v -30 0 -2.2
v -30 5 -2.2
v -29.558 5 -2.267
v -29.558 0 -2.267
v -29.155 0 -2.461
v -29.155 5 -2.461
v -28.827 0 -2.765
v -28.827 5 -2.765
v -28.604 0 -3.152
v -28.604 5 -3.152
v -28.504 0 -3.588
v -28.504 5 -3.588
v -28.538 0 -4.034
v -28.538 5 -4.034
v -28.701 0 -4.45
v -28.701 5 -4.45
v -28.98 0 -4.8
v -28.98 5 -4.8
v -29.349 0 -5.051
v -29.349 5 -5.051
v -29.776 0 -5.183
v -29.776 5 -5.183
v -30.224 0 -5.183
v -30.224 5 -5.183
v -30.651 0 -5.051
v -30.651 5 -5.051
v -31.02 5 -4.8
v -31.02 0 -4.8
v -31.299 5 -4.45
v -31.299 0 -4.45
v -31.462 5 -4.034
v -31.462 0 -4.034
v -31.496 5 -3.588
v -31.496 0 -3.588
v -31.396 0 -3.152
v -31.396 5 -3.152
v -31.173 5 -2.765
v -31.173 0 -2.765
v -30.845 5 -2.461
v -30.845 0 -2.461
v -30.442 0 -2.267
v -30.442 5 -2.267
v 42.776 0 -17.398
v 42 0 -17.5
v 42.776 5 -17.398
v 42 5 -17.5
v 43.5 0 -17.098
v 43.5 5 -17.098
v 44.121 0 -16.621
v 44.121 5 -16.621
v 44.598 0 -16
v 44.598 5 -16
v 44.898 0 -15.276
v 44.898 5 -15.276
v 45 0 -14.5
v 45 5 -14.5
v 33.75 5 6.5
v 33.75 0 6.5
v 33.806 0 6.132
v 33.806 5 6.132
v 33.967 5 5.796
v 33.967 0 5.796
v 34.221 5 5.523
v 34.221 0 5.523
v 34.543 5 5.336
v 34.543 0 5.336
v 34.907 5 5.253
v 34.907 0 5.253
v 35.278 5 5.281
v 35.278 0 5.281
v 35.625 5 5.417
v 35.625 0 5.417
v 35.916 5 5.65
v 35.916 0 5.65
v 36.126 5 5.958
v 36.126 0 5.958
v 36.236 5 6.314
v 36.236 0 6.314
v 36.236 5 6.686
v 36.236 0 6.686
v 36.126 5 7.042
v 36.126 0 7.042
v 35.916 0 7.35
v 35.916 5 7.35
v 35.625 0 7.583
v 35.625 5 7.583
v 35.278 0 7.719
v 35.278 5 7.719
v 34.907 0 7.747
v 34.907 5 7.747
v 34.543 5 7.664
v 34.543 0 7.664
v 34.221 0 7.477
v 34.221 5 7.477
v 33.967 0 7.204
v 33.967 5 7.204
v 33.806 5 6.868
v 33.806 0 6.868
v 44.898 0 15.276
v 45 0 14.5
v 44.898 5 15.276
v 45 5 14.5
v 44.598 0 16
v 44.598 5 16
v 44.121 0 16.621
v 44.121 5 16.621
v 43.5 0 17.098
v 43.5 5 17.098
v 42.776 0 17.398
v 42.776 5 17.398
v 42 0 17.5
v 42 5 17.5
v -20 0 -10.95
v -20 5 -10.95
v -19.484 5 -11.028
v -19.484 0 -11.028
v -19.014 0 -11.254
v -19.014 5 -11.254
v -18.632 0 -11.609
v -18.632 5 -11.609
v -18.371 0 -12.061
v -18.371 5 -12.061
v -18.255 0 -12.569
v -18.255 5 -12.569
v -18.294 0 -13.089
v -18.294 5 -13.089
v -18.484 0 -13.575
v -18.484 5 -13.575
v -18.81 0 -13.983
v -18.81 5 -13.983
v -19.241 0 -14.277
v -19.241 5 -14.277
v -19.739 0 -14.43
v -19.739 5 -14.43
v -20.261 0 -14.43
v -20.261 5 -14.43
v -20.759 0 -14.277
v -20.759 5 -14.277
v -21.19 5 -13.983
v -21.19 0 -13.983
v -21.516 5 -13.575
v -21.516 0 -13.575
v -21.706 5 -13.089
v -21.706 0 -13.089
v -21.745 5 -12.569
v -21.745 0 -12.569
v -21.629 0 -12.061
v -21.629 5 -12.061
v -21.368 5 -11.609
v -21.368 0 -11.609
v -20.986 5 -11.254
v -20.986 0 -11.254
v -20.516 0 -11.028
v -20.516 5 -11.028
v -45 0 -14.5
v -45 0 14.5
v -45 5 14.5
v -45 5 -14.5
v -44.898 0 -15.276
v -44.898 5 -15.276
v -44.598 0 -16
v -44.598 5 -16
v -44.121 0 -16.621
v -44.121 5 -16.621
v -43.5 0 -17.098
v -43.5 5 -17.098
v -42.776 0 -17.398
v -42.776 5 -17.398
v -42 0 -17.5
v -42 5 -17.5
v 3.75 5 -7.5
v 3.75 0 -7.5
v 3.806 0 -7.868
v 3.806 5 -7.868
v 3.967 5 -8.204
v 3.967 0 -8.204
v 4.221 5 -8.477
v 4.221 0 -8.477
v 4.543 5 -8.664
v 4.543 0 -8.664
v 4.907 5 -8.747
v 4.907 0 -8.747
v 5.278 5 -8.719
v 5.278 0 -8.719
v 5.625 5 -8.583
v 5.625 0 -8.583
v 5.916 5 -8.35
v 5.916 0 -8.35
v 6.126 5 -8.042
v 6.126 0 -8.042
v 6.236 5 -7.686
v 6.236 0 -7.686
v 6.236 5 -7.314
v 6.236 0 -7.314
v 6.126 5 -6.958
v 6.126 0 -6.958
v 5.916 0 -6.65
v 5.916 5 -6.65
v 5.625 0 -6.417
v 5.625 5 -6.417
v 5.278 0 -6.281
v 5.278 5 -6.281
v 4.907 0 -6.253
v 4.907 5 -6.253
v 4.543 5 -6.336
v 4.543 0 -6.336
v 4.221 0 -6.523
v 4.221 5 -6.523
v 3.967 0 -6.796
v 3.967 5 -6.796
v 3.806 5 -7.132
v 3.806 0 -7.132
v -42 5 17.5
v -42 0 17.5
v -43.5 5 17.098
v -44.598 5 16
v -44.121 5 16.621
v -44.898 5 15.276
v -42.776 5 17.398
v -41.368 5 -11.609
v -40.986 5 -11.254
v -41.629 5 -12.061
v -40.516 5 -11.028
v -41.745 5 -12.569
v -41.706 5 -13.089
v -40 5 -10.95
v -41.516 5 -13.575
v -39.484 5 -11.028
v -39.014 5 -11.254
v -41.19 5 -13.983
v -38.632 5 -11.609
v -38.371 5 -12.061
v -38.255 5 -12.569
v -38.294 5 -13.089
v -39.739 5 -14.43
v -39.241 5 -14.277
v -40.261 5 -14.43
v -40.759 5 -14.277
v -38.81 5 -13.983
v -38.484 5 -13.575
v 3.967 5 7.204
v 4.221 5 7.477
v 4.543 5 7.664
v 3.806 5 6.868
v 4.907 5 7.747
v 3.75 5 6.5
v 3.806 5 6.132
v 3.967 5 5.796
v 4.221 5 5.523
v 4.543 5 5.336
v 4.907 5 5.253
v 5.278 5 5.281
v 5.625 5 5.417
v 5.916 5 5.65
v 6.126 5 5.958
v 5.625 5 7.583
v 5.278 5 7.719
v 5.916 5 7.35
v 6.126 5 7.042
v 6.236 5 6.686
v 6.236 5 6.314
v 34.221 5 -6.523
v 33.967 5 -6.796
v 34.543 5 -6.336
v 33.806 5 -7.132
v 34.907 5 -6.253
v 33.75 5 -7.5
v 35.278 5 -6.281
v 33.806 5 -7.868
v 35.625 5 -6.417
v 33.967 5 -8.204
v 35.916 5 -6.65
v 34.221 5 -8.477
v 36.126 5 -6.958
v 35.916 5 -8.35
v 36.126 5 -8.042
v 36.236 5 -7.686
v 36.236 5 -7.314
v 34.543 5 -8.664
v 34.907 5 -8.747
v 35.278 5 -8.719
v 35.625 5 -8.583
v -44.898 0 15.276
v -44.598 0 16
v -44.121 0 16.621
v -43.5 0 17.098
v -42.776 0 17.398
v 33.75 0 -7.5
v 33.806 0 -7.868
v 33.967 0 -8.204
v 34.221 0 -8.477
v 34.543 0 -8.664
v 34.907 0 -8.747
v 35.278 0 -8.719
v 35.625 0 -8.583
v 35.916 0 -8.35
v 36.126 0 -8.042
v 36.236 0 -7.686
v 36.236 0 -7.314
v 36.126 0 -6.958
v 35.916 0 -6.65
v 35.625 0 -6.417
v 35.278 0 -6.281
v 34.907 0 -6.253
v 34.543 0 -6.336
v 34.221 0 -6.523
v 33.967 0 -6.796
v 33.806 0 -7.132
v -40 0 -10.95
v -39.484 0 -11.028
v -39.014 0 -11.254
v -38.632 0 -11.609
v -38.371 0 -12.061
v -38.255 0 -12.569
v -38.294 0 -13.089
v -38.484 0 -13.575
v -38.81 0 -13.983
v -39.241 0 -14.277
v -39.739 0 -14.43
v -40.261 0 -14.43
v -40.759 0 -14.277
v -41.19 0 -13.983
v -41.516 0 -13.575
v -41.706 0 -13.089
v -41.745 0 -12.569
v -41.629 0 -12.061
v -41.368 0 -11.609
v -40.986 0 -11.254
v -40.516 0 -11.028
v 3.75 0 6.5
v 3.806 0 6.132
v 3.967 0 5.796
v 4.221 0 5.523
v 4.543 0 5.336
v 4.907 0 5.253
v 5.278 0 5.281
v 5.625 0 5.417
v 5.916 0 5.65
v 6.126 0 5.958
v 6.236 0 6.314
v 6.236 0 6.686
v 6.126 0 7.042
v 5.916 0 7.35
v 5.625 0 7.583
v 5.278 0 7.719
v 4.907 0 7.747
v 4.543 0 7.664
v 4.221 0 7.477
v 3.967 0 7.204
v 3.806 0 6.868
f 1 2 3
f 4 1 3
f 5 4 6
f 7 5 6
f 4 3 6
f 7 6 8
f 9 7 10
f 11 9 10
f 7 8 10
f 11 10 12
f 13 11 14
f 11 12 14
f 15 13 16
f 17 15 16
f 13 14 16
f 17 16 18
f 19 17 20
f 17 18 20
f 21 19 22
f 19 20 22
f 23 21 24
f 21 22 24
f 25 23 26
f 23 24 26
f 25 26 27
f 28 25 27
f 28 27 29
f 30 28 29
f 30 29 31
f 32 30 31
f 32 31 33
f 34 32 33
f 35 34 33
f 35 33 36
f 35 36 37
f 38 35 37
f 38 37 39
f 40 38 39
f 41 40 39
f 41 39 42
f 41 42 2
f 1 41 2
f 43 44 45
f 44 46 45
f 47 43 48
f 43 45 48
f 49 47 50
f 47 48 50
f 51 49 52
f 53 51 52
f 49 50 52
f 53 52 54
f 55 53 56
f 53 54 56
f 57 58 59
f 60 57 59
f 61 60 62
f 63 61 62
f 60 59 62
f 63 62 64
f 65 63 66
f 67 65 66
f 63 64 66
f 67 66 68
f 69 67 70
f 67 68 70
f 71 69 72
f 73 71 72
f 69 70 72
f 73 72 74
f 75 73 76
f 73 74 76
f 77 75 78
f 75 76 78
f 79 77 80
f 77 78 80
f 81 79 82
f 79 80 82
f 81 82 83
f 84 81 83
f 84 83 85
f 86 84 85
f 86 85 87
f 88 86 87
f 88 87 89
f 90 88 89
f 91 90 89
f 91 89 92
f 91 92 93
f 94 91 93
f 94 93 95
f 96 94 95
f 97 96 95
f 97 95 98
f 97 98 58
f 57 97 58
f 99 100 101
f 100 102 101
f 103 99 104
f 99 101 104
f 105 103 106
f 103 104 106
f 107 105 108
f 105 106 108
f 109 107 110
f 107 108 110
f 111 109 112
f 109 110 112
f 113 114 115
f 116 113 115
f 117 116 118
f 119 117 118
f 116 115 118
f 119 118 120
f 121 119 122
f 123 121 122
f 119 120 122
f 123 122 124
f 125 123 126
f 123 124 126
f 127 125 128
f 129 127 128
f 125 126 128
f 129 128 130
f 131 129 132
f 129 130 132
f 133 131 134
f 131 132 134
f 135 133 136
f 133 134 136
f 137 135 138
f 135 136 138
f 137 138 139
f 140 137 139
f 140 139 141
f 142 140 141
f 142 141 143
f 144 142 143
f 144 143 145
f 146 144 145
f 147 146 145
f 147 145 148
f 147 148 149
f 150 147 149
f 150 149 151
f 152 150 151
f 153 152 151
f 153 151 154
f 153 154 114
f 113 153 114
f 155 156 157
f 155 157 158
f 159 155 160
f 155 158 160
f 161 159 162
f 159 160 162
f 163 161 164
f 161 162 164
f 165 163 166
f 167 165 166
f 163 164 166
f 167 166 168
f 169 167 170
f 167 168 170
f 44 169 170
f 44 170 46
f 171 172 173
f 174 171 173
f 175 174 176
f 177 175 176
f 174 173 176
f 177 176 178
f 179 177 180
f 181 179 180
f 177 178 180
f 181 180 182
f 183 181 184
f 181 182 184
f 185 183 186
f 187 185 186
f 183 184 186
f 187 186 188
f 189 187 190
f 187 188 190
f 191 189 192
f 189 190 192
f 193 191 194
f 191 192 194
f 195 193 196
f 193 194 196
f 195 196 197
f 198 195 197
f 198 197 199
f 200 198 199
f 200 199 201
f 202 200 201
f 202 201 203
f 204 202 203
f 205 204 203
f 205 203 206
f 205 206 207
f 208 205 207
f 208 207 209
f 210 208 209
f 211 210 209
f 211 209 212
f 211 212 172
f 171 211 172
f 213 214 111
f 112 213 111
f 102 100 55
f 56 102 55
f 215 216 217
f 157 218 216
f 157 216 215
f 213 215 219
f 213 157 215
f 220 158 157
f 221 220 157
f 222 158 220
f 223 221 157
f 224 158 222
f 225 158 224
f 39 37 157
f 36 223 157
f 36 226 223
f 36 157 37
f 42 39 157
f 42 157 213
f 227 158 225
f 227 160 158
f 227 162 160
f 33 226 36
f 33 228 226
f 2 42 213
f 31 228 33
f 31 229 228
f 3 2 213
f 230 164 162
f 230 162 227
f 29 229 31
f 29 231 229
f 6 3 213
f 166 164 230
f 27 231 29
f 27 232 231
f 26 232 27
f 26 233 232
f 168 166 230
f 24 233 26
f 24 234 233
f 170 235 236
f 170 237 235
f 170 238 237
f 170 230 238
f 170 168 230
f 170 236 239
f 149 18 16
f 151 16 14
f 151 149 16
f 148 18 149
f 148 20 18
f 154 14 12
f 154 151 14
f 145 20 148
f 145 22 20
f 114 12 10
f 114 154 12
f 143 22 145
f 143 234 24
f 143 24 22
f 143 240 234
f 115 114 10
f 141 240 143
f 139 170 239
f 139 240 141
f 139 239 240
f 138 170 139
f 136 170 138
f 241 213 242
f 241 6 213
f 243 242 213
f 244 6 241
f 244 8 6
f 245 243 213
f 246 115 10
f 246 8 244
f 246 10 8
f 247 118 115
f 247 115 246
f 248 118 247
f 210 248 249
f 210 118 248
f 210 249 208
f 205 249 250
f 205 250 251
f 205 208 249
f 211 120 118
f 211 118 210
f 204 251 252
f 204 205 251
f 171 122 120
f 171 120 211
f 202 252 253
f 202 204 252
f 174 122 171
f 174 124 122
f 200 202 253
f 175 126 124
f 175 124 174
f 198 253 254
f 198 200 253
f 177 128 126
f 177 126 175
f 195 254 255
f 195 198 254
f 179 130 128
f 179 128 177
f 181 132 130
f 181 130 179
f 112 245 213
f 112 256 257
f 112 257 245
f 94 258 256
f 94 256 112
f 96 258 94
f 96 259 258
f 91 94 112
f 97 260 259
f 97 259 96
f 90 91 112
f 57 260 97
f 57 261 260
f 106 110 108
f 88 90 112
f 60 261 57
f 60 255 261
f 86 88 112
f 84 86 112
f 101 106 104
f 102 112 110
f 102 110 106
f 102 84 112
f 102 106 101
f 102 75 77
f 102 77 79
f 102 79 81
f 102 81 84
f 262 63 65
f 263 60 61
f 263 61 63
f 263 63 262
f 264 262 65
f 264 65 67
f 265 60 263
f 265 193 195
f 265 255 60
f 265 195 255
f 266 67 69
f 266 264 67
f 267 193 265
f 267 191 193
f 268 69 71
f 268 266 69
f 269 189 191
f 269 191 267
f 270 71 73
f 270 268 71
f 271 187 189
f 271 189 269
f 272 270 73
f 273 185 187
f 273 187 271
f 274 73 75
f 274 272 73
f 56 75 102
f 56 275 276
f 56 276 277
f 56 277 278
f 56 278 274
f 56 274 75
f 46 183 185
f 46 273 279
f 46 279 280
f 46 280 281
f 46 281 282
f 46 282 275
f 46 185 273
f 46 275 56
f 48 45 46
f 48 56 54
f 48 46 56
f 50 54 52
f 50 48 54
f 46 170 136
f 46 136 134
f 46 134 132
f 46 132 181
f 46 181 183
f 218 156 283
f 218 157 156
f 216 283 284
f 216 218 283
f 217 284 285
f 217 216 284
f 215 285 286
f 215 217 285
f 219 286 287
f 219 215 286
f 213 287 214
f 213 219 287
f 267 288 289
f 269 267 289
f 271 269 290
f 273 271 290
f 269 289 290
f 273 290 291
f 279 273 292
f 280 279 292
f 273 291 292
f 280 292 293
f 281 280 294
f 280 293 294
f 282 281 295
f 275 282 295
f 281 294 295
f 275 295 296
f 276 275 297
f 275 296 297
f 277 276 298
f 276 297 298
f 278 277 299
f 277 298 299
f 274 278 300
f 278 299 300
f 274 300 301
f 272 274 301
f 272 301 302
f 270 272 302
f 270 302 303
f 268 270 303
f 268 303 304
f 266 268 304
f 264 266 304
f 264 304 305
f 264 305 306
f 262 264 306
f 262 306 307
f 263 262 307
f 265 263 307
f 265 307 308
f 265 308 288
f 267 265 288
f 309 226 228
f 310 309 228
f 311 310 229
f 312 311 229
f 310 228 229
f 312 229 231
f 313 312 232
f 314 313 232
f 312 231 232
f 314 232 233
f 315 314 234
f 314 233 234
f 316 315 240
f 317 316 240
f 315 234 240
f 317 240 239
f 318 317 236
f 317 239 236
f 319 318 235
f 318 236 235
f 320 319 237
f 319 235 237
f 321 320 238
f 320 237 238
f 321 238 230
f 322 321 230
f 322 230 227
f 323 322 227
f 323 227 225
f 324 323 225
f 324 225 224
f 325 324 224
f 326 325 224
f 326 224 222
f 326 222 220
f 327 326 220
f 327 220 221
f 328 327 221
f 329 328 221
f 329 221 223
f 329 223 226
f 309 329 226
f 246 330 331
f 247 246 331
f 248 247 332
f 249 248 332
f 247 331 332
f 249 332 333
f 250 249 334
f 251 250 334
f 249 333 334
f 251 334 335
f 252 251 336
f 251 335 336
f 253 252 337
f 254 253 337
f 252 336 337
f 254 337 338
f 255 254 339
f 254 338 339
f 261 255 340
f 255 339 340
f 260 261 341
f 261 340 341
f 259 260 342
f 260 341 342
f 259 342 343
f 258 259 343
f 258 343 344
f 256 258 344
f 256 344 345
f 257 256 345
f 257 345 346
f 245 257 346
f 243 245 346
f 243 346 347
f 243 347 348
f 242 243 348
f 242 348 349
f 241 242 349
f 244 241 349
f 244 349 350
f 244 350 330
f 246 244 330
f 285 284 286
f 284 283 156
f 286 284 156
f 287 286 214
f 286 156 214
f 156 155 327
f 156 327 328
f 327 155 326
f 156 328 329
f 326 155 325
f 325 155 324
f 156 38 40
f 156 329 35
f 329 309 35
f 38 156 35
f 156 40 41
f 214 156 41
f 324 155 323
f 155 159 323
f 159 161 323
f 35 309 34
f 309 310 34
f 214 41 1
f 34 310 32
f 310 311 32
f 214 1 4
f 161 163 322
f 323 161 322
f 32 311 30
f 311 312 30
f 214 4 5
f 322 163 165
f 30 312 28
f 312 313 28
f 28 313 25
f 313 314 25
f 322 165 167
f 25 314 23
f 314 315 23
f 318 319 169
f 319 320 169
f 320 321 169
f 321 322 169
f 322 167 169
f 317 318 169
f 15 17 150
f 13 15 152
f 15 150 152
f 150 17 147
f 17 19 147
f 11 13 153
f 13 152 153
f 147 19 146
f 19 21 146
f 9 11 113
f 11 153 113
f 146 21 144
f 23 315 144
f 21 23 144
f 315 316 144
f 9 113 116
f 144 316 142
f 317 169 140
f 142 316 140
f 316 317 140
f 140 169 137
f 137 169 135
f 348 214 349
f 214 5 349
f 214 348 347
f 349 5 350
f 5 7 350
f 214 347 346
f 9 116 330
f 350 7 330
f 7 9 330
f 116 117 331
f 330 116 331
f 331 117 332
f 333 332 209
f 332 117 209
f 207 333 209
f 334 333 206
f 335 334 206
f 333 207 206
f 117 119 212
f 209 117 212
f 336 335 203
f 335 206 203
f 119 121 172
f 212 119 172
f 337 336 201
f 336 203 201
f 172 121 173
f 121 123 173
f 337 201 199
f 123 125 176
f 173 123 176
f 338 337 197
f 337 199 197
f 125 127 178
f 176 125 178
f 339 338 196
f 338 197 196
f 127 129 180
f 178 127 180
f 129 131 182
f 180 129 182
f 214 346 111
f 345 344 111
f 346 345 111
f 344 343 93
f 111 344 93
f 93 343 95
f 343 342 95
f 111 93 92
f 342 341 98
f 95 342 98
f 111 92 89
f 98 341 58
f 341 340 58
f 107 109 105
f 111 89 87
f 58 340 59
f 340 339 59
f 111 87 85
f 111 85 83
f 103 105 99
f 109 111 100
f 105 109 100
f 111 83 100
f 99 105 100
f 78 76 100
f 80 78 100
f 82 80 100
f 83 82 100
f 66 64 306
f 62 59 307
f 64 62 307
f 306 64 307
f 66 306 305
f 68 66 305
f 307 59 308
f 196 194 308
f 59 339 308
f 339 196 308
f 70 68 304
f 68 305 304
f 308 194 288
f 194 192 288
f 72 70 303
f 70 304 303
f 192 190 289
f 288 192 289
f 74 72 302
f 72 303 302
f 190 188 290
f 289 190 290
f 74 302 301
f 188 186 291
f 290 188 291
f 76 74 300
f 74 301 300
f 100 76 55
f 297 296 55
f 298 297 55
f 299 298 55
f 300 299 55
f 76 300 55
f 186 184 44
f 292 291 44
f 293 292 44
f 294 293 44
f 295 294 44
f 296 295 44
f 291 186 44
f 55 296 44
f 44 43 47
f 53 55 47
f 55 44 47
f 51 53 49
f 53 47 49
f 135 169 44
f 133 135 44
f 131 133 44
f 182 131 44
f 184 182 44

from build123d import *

# Parameters (mm, degrees)
SKETCH_1_W                  = 90
SKETCH_1_H                  = 35
EXTRUDE_1_DEPTH             = 5
SKETCH_2_R                  = 1
CUT_EXTRUDE_1_DEPTH         = 49.541219597
PATTERN_LINEAR_1_COUNT      = 2
PATTERN_LINEAR_1_PITCH      = 30
PATTERN_LINEAR_1_COUNT_DIR2 = 2
PATTERN_LINEAR_1_PITCH_DIR2 = 14
SKETCH_3_R                  = 1.75
CUT_EXTRUDE_2_DEPTH         = 49.541219597
PATTERN_LINEAR_2_COUNT      = 2
PATTERN_LINEAR_2_PITCH      = 20
SKETCH_6_R                  = 1.5
CUT_EXTRUDE_3_DEPTH         = 49.541219597
FILLET_1_R                  = 3
FILLET_2_R                  = 3
FILLET_3_R                  = 3
FILLET_4_R                  = 3
HOLE_WIZARD_M3_1_D          = 2.5


with BuildPart() as part:
    # 草图1 → 凸台-拉伸1 (new body)
    with BuildSketch(Plane(origin=(0, 0, 0), x_dir=(1, 0, 0), z_dir=(0, 1, 0))):
        Rectangle(SKETCH_1_W, SKETCH_1_H)
    extrude(amount=EXTRUDE_1_DEPTH)

    # 草图2 → 切除-拉伸1 (cut, through all)
    with BuildSketch(Plane(origin=(0, 5, 0), x_dir=(1, 0, 0), z_dir=(0, 1, 0))):
        with Locations(Location((35, 7.5, 0), (0, 0, 270))):
            Circle(SKETCH_2_R)
    cut_extrude_1 = extrude(amount=-CUT_EXTRUDE_1_DEPTH, mode=Mode.SUBTRACT)

    # 阵列(线性)1: Cut-Extrude 1 2 × 2
    with Locations(*[(-i * PATTERN_LINEAR_1_PITCH, 0, j * PATTERN_LINEAR_1_PITCH_DIR2) for i in range(PATTERN_LINEAR_1_COUNT) for j in range(PATTERN_LINEAR_1_COUNT_DIR2) if (i, j) != (0, 0)]):
        add(cut_extrude_1, mode=Mode.SUBTRACT)

    # 草图3 → 切除-拉伸2 (cut, through all)
    with BuildSketch(Plane(origin=(0, 5, 0), x_dir=(1, 0, 0), z_dir=(0, 1, 0))):
        with Locations(Location((-20, 12.7, 0), (0, 0, 270))):
            Circle(SKETCH_3_R)
    cut_extrude_2 = extrude(amount=-CUT_EXTRUDE_2_DEPTH, mode=Mode.SUBTRACT)

    # 阵列(线性)2: 切除-拉伸2 ×2
    with Locations(*[(-i * PATTERN_LINEAR_2_PITCH, 0, 0) for i in range(1, PATTERN_LINEAR_2_COUNT)]):
        add(cut_extrude_2, mode=Mode.SUBTRACT)

    # 草图6 → 切除-拉伸3 (cut, through all)
    with BuildSketch(Plane(origin=(0, 5, 0), x_dir=(1, 0, 0), z_dir=(0, 1, 0))):
        with Locations(Location((-30, 3.7, 0), (0, 0, 270))):
            Circle(SKETCH_6_R)
    extrude(amount=-CUT_EXTRUDE_3_DEPTH, mode=Mode.SUBTRACT)

    # 圆角1
    fillet_1_edges = [part.edges().sort_by_distance(p)[0] for p in [
        (-45, 2.5, 17.5),
    ]]
    fillet(fillet_1_edges, radius=FILLET_1_R)

    # 圆角2
    fillet_2_edges = [part.edges().sort_by_distance(p)[0] for p in [
        (-45, 2.5, -17.5),
    ]]
    fillet(fillet_2_edges, radius=FILLET_2_R)

    # 圆角3
    fillet_3_edges = [part.edges().sort_by_distance(p)[0] for p in [
        (45, 2.5, -17.5),
    ]]
    fillet(fillet_3_edges, radius=FILLET_3_R)

    # 圆角4
    fillet_4_edges = [part.edges().sort_by_distance(p)[0] for p in [
        (45, 2.5, 17.5),
    ]]
    fillet(fillet_4_edges, radius=FILLET_4_R)

    # M3 螺纹孔1 (through all)
    with Locations(Plane(origin=(0, 5, 0), x_dir=(1, 0, 0), z_dir=(0, 1, 0))):
        with Locations((5, 7.5), (5, -6.5), (35, 7.5), (35, -6.5)):
            Hole(HOLE_WIZARD_M3_1_D / 2)


solid = part.part
